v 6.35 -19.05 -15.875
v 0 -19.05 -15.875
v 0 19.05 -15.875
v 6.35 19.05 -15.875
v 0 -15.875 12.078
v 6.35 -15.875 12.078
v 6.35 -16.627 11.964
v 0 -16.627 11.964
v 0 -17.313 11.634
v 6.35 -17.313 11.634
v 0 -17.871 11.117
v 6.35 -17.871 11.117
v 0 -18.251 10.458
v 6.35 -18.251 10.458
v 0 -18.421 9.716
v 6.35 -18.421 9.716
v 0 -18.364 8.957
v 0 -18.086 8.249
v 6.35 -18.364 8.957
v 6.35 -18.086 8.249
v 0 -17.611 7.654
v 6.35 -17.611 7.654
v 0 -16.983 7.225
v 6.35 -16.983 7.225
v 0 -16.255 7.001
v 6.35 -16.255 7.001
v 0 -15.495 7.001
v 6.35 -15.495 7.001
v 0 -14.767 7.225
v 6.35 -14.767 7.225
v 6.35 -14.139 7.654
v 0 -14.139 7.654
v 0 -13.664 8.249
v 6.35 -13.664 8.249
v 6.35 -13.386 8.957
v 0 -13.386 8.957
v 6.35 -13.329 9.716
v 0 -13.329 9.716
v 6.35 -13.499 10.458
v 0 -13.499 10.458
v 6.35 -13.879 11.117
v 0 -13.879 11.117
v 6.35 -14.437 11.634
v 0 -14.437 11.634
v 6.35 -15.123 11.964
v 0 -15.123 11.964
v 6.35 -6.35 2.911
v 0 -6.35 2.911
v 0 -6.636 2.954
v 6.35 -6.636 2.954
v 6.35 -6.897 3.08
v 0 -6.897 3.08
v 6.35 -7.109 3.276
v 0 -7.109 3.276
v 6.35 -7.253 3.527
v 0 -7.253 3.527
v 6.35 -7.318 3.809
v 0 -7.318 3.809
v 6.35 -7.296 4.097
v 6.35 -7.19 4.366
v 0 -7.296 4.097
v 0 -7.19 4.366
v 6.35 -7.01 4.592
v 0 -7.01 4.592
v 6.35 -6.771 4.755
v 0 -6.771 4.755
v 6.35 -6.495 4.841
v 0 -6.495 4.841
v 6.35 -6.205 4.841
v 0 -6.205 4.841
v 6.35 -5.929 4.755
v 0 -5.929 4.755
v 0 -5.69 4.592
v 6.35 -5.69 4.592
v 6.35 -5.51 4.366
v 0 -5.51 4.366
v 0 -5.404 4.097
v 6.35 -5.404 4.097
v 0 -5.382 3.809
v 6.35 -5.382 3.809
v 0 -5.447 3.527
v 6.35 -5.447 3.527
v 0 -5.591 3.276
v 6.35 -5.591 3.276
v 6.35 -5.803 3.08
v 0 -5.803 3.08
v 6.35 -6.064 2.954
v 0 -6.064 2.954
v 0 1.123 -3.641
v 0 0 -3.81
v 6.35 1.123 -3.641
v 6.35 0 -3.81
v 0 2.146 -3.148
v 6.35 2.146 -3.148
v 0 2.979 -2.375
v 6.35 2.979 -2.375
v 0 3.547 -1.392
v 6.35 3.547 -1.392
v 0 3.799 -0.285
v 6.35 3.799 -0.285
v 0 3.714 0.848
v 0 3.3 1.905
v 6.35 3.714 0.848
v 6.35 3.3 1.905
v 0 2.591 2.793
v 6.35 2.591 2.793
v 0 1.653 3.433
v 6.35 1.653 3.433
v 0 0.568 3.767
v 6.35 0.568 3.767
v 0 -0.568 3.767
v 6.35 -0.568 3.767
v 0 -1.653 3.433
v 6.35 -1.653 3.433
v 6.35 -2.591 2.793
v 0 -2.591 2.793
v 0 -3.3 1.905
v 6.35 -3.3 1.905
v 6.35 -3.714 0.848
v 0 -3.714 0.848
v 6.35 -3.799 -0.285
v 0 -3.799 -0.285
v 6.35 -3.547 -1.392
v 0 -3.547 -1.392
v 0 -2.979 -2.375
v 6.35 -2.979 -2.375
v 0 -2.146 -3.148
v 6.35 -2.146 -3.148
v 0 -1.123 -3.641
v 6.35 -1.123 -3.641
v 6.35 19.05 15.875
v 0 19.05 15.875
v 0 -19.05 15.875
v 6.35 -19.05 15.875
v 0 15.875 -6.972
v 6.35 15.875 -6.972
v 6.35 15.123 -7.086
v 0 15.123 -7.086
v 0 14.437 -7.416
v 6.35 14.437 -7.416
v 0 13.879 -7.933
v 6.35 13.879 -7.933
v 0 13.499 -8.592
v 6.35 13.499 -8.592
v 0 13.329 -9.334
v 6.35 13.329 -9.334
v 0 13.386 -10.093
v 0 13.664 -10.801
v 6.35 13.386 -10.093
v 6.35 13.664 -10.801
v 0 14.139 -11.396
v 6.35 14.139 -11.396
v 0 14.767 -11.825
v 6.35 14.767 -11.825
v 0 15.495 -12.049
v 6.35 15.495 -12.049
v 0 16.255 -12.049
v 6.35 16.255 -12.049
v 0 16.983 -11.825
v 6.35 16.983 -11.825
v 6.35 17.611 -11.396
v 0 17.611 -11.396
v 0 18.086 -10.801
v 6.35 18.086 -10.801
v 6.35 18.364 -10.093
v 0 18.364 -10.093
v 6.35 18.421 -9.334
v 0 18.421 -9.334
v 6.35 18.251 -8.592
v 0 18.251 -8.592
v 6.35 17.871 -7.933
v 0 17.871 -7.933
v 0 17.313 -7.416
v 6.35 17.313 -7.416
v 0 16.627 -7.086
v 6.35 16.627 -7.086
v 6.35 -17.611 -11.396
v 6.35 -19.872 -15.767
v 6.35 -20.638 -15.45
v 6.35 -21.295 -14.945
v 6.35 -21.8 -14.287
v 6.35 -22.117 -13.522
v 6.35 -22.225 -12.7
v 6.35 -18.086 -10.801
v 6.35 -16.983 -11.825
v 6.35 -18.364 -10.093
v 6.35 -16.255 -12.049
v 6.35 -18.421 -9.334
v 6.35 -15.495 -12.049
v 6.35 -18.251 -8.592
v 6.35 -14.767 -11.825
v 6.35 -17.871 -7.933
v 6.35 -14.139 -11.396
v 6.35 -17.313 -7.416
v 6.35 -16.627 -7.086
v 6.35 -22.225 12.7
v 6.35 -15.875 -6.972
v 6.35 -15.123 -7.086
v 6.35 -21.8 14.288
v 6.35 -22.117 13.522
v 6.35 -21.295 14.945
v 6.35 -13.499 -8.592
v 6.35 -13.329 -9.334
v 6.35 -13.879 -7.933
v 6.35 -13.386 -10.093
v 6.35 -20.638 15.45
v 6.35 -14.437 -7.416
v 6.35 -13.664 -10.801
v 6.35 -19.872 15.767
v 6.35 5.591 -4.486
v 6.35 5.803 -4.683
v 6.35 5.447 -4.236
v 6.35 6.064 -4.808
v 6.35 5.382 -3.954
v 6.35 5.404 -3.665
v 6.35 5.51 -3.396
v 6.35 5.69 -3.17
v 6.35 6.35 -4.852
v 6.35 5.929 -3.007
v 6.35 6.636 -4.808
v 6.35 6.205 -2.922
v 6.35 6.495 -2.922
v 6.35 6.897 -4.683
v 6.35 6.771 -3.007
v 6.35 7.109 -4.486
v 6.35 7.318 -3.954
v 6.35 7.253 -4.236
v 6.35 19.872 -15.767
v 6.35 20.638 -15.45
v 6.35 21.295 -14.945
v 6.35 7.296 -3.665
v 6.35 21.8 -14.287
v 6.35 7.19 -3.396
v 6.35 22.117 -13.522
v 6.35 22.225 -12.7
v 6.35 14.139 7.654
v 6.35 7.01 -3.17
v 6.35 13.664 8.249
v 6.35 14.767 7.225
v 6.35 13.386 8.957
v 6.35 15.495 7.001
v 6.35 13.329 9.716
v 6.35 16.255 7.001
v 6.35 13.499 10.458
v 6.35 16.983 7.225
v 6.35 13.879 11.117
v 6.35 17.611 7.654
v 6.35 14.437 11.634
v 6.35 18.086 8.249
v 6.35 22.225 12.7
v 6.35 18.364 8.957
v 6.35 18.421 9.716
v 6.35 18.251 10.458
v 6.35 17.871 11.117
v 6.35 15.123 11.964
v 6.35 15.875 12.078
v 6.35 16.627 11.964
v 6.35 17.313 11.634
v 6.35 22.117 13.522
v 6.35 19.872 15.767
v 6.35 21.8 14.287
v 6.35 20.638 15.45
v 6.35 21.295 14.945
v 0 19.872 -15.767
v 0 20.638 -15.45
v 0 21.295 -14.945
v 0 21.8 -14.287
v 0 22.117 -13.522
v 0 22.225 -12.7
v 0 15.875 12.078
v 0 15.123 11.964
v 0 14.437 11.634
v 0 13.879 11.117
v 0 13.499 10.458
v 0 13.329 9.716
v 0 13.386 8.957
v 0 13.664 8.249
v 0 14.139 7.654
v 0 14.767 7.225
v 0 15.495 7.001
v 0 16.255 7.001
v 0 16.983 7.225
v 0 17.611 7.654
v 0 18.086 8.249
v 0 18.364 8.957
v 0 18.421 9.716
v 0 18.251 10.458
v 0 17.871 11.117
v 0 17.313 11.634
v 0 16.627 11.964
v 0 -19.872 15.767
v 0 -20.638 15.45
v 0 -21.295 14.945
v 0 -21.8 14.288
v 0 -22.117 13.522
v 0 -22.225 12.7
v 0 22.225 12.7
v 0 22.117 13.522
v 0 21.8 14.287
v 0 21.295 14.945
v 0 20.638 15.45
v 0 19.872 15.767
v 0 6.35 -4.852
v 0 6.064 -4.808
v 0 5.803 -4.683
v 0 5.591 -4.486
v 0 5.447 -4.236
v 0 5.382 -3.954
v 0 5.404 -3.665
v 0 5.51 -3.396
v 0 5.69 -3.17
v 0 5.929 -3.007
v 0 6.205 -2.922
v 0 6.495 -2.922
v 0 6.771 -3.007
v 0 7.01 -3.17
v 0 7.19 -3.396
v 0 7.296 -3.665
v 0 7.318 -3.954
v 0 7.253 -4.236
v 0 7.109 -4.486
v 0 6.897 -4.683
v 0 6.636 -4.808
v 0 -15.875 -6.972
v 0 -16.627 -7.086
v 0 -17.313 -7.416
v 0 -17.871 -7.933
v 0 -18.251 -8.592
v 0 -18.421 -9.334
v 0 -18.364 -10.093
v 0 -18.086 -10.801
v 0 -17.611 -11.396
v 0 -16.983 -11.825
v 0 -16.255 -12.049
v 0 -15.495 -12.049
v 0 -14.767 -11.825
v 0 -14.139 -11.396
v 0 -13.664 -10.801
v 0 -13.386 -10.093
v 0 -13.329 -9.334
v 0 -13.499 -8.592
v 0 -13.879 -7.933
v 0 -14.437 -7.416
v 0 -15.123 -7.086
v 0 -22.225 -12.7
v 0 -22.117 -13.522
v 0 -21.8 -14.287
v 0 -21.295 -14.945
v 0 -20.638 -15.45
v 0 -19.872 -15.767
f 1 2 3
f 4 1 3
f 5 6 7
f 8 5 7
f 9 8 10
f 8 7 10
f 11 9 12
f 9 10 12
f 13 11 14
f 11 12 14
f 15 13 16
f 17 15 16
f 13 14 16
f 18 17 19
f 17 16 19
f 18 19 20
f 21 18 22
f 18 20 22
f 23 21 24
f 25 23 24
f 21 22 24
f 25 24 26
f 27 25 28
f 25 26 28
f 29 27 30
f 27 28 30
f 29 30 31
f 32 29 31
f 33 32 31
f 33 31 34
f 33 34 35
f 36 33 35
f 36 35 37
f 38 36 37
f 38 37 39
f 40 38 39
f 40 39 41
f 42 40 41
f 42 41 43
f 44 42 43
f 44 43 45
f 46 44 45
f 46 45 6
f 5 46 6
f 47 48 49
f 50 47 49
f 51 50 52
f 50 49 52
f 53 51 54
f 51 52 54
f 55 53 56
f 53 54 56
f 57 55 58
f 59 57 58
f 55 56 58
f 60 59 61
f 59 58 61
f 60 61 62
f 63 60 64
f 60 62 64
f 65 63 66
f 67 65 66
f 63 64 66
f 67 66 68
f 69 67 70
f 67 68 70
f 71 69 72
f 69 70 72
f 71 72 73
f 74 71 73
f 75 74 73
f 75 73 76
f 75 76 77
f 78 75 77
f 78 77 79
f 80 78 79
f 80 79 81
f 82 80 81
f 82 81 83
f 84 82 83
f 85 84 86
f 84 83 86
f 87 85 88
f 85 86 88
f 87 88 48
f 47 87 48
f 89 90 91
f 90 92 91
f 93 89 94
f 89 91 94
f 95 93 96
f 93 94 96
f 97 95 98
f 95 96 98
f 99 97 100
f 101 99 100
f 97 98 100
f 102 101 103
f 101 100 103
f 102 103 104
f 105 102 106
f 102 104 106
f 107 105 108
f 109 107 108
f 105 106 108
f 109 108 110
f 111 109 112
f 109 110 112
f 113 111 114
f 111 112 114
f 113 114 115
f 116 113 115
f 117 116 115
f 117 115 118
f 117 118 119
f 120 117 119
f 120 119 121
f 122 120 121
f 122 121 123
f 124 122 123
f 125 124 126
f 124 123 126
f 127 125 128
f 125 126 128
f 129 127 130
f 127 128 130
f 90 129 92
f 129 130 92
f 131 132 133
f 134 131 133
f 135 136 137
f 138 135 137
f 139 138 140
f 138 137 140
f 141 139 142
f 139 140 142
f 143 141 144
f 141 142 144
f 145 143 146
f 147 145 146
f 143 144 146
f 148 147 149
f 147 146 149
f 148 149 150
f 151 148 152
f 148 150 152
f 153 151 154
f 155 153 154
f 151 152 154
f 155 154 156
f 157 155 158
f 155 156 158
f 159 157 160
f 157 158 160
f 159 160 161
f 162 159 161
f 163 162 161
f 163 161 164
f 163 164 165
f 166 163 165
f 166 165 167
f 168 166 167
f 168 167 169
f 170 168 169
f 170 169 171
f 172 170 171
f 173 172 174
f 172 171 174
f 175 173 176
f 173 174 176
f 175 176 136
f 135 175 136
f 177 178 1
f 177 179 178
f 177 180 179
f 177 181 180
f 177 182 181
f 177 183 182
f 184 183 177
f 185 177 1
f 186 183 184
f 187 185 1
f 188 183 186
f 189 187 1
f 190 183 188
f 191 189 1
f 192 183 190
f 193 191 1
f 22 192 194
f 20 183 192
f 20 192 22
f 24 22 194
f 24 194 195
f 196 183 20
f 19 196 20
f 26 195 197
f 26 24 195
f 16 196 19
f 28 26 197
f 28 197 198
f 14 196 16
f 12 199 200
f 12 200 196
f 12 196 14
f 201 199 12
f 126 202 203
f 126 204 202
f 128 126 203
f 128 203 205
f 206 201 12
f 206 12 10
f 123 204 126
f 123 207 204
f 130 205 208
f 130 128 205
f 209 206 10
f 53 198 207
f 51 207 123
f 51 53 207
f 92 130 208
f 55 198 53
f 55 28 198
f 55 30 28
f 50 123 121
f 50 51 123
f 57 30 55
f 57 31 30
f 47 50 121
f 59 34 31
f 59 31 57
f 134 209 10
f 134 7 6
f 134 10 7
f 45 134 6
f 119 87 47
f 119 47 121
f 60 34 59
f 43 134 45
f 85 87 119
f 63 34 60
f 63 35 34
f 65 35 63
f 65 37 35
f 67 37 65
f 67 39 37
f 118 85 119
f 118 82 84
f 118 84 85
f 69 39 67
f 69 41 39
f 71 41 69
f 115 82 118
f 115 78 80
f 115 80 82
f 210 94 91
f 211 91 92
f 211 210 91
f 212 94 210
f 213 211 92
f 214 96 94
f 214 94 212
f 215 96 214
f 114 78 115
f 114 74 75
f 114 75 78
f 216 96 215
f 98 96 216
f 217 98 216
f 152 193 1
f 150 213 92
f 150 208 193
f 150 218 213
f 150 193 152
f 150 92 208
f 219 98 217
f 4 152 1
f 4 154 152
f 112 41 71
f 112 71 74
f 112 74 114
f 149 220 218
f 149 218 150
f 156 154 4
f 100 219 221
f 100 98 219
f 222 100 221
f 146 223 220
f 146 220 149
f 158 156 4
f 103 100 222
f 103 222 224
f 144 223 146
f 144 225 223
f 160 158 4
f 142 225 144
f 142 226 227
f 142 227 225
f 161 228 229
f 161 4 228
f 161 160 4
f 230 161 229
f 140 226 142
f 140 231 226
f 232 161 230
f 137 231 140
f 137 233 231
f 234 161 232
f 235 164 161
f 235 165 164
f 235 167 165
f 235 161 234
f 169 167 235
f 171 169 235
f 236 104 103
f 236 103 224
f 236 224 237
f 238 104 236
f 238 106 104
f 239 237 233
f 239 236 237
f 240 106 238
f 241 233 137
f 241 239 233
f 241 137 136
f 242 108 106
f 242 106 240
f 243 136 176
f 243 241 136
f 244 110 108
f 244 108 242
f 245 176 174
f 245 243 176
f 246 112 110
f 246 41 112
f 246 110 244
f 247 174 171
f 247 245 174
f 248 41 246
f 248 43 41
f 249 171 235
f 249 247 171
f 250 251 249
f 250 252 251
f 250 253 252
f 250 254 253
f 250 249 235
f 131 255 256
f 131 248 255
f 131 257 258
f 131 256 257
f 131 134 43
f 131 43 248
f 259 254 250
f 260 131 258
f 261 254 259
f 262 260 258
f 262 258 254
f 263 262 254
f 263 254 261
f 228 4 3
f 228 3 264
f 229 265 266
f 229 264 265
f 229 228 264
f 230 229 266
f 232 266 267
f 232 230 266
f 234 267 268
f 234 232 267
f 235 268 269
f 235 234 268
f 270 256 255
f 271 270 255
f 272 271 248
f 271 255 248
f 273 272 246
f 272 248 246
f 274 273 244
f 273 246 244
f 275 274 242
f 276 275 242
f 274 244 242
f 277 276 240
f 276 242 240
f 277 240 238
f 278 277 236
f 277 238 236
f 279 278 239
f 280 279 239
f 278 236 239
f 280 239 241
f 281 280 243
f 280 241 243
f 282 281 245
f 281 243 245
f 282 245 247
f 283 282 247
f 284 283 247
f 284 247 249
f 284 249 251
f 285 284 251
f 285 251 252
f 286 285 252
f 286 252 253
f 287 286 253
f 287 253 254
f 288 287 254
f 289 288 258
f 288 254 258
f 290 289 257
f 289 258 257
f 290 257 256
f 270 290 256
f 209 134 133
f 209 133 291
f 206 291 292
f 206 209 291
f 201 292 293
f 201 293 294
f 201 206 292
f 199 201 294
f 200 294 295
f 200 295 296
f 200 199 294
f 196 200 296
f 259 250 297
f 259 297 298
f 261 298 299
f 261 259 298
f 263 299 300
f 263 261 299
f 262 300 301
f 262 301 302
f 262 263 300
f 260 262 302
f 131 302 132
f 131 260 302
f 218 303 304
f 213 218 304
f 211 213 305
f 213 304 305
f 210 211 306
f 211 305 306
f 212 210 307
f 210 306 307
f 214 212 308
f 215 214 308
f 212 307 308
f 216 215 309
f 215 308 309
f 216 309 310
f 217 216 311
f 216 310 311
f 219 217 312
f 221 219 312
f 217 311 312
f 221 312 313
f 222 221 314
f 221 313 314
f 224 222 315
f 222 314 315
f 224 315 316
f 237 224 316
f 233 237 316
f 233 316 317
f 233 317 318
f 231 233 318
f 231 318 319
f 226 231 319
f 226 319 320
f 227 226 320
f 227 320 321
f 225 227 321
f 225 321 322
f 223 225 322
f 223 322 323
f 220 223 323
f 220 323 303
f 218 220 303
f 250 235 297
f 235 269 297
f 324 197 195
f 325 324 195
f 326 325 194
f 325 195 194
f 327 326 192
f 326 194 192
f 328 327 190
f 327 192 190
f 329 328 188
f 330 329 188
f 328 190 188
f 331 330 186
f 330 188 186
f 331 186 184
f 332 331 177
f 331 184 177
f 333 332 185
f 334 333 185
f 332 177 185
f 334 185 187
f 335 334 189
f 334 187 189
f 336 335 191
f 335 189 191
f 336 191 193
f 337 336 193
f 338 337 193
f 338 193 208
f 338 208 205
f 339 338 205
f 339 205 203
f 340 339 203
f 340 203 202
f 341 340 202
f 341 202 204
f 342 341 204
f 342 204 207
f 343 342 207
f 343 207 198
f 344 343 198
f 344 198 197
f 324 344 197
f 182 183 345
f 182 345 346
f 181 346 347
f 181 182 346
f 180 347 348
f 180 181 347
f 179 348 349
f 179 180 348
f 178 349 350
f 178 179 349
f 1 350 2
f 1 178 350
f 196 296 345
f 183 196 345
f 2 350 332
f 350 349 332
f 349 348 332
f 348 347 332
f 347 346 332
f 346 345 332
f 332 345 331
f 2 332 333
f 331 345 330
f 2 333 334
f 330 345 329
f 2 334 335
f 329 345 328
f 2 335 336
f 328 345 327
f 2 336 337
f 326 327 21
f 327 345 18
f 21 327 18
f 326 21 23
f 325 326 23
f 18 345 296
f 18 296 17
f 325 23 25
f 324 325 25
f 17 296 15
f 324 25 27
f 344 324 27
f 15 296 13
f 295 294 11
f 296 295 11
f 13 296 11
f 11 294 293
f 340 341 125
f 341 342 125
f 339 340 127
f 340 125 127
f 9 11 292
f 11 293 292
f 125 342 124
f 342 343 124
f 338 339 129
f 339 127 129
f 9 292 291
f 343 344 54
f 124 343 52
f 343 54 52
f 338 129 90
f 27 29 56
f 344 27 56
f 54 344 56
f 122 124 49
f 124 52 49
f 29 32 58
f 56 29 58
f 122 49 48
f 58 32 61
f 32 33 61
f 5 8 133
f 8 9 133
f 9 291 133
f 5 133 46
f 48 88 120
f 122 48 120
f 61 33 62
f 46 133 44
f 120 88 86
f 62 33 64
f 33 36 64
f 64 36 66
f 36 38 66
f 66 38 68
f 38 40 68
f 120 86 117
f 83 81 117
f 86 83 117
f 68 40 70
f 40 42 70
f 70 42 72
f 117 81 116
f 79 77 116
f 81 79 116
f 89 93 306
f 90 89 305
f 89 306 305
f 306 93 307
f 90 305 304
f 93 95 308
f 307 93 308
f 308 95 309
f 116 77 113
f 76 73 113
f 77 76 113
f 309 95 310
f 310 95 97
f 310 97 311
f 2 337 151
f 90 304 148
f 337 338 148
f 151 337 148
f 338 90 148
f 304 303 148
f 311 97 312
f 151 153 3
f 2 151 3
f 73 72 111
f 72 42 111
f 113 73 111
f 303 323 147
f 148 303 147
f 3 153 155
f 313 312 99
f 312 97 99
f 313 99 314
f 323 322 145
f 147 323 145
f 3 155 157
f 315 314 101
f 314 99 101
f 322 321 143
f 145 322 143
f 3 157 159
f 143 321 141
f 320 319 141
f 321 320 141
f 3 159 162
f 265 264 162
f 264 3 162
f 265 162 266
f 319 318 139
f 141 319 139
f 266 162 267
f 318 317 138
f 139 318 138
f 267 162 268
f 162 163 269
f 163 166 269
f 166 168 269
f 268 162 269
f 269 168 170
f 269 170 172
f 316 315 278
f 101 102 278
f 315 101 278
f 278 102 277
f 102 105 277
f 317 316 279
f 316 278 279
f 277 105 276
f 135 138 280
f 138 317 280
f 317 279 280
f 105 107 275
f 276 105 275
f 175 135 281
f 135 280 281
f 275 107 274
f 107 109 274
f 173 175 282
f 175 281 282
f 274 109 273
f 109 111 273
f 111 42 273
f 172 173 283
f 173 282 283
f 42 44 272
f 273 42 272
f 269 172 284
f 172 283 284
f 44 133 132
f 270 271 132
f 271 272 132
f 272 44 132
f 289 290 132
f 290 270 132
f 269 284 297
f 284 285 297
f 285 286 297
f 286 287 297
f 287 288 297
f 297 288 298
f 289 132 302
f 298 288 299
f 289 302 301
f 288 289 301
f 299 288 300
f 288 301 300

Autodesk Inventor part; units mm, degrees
ref_plane "YZ Plane" through (0, 0, 0) normal (1, 0, 0) x (0, 1, 0)
ref_plane "XZ Plane" through (0, 0, 0) normal (0, 1, 0) x (-1, 0, 0)
ref_plane "XY Plane" through (0, 0, 0) normal (0, 0, 1) x (1, 0, 0)
sketch "Sketch1" plane through (0, 0, 0) normal (1, 0, 0) x (0, 1, 0)
  line L0 (22.225, 15.875) -> (-22.225, 15.875)
  line L1 (-22.225, 15.875) -> (-22.225, -15.875)
  line L2 (-22.225, -15.875) -> (22.225, -15.875)
  line L3 (22.225, -15.875) -> (22.225, 15.875)
  line L4 (22.225, 15.875) -> (-22.225, -15.875) construction
  line L5 (-22.225, 15.875) -> (22.225, -15.875) construction
  line L6 (15.875, 9.525) -> (-15.875, 9.525) construction
  line L7 (-15.875, 9.525) -> (-15.875, -9.525) construction
  line L8 (-15.875, -9.525) -> (15.875, -9.525) construction
  line L9 (15.875, -9.525) -> (15.875, 9.525) construction
  line L10 (15.875, 9.525) -> (-15.875, -9.525) construction
  line L11 (-15.875, 9.525) -> (15.875, -9.525) construction
  point P0 (0, 0)
  dimension "d0" = 44.45
  dimension "d1" = 31.75
  dimension "d2" = 31.75
  dimension "d3" = 19.05
extrude "Extrusion1" add sketch "Sketch1" along normal blind 6.35
hole "Hole1" at (0, 15.875, 9.525) at (0, 15.875, -9.525) at (0, -15.875, 9.525) at (0, -15.875, -9.525) direction (1, 0, 0) diameter 5.1054 end through all clearance for "Flat Head Machine Screw (82)" size "#10" standard "Ansi Unified Screw Threads"
sketch "Sketch2" plane through (6.35, 0, 0) normal (1, 0, 0) x (0, 0, -1)
  line L0 (3.8812, 6.35) -> (-3.8812, -6.35) construction
  point P0 (0, 0)
  point P1 (0, 0)
  dimension "d13" = 14.8844
  dimension "d27" = 6.35
hole "Hole2" at (6.35, 6.35, -3.8812) at (6.35, -6.35, 3.8812) direction (-1, 0, 0) diameter 1.9406 end through all thread size "3-48 UNC" class "2B" standard "ANSI Unified Screw Threads"
sketch "Sketch3" plane through (6.35, 0, 0) normal (1, 0, 0) x (0, 0, -1)
  circle A0 centre (0, 0) radius 3.81
  dimension "d21" = 7.62
extrude "Extrusion2" cut sketch "Sketch3" against normal blind 6.35
fillet "Fillet1" radius 3.175 4 edges at (3.175, 22.225, 15.875) (3.175, 22.225, -15.875) (3.175, -22.225, -15.875) (3.175, -22.225, 15.875)
properties part number "AR-015" material "ABS Plastic"
